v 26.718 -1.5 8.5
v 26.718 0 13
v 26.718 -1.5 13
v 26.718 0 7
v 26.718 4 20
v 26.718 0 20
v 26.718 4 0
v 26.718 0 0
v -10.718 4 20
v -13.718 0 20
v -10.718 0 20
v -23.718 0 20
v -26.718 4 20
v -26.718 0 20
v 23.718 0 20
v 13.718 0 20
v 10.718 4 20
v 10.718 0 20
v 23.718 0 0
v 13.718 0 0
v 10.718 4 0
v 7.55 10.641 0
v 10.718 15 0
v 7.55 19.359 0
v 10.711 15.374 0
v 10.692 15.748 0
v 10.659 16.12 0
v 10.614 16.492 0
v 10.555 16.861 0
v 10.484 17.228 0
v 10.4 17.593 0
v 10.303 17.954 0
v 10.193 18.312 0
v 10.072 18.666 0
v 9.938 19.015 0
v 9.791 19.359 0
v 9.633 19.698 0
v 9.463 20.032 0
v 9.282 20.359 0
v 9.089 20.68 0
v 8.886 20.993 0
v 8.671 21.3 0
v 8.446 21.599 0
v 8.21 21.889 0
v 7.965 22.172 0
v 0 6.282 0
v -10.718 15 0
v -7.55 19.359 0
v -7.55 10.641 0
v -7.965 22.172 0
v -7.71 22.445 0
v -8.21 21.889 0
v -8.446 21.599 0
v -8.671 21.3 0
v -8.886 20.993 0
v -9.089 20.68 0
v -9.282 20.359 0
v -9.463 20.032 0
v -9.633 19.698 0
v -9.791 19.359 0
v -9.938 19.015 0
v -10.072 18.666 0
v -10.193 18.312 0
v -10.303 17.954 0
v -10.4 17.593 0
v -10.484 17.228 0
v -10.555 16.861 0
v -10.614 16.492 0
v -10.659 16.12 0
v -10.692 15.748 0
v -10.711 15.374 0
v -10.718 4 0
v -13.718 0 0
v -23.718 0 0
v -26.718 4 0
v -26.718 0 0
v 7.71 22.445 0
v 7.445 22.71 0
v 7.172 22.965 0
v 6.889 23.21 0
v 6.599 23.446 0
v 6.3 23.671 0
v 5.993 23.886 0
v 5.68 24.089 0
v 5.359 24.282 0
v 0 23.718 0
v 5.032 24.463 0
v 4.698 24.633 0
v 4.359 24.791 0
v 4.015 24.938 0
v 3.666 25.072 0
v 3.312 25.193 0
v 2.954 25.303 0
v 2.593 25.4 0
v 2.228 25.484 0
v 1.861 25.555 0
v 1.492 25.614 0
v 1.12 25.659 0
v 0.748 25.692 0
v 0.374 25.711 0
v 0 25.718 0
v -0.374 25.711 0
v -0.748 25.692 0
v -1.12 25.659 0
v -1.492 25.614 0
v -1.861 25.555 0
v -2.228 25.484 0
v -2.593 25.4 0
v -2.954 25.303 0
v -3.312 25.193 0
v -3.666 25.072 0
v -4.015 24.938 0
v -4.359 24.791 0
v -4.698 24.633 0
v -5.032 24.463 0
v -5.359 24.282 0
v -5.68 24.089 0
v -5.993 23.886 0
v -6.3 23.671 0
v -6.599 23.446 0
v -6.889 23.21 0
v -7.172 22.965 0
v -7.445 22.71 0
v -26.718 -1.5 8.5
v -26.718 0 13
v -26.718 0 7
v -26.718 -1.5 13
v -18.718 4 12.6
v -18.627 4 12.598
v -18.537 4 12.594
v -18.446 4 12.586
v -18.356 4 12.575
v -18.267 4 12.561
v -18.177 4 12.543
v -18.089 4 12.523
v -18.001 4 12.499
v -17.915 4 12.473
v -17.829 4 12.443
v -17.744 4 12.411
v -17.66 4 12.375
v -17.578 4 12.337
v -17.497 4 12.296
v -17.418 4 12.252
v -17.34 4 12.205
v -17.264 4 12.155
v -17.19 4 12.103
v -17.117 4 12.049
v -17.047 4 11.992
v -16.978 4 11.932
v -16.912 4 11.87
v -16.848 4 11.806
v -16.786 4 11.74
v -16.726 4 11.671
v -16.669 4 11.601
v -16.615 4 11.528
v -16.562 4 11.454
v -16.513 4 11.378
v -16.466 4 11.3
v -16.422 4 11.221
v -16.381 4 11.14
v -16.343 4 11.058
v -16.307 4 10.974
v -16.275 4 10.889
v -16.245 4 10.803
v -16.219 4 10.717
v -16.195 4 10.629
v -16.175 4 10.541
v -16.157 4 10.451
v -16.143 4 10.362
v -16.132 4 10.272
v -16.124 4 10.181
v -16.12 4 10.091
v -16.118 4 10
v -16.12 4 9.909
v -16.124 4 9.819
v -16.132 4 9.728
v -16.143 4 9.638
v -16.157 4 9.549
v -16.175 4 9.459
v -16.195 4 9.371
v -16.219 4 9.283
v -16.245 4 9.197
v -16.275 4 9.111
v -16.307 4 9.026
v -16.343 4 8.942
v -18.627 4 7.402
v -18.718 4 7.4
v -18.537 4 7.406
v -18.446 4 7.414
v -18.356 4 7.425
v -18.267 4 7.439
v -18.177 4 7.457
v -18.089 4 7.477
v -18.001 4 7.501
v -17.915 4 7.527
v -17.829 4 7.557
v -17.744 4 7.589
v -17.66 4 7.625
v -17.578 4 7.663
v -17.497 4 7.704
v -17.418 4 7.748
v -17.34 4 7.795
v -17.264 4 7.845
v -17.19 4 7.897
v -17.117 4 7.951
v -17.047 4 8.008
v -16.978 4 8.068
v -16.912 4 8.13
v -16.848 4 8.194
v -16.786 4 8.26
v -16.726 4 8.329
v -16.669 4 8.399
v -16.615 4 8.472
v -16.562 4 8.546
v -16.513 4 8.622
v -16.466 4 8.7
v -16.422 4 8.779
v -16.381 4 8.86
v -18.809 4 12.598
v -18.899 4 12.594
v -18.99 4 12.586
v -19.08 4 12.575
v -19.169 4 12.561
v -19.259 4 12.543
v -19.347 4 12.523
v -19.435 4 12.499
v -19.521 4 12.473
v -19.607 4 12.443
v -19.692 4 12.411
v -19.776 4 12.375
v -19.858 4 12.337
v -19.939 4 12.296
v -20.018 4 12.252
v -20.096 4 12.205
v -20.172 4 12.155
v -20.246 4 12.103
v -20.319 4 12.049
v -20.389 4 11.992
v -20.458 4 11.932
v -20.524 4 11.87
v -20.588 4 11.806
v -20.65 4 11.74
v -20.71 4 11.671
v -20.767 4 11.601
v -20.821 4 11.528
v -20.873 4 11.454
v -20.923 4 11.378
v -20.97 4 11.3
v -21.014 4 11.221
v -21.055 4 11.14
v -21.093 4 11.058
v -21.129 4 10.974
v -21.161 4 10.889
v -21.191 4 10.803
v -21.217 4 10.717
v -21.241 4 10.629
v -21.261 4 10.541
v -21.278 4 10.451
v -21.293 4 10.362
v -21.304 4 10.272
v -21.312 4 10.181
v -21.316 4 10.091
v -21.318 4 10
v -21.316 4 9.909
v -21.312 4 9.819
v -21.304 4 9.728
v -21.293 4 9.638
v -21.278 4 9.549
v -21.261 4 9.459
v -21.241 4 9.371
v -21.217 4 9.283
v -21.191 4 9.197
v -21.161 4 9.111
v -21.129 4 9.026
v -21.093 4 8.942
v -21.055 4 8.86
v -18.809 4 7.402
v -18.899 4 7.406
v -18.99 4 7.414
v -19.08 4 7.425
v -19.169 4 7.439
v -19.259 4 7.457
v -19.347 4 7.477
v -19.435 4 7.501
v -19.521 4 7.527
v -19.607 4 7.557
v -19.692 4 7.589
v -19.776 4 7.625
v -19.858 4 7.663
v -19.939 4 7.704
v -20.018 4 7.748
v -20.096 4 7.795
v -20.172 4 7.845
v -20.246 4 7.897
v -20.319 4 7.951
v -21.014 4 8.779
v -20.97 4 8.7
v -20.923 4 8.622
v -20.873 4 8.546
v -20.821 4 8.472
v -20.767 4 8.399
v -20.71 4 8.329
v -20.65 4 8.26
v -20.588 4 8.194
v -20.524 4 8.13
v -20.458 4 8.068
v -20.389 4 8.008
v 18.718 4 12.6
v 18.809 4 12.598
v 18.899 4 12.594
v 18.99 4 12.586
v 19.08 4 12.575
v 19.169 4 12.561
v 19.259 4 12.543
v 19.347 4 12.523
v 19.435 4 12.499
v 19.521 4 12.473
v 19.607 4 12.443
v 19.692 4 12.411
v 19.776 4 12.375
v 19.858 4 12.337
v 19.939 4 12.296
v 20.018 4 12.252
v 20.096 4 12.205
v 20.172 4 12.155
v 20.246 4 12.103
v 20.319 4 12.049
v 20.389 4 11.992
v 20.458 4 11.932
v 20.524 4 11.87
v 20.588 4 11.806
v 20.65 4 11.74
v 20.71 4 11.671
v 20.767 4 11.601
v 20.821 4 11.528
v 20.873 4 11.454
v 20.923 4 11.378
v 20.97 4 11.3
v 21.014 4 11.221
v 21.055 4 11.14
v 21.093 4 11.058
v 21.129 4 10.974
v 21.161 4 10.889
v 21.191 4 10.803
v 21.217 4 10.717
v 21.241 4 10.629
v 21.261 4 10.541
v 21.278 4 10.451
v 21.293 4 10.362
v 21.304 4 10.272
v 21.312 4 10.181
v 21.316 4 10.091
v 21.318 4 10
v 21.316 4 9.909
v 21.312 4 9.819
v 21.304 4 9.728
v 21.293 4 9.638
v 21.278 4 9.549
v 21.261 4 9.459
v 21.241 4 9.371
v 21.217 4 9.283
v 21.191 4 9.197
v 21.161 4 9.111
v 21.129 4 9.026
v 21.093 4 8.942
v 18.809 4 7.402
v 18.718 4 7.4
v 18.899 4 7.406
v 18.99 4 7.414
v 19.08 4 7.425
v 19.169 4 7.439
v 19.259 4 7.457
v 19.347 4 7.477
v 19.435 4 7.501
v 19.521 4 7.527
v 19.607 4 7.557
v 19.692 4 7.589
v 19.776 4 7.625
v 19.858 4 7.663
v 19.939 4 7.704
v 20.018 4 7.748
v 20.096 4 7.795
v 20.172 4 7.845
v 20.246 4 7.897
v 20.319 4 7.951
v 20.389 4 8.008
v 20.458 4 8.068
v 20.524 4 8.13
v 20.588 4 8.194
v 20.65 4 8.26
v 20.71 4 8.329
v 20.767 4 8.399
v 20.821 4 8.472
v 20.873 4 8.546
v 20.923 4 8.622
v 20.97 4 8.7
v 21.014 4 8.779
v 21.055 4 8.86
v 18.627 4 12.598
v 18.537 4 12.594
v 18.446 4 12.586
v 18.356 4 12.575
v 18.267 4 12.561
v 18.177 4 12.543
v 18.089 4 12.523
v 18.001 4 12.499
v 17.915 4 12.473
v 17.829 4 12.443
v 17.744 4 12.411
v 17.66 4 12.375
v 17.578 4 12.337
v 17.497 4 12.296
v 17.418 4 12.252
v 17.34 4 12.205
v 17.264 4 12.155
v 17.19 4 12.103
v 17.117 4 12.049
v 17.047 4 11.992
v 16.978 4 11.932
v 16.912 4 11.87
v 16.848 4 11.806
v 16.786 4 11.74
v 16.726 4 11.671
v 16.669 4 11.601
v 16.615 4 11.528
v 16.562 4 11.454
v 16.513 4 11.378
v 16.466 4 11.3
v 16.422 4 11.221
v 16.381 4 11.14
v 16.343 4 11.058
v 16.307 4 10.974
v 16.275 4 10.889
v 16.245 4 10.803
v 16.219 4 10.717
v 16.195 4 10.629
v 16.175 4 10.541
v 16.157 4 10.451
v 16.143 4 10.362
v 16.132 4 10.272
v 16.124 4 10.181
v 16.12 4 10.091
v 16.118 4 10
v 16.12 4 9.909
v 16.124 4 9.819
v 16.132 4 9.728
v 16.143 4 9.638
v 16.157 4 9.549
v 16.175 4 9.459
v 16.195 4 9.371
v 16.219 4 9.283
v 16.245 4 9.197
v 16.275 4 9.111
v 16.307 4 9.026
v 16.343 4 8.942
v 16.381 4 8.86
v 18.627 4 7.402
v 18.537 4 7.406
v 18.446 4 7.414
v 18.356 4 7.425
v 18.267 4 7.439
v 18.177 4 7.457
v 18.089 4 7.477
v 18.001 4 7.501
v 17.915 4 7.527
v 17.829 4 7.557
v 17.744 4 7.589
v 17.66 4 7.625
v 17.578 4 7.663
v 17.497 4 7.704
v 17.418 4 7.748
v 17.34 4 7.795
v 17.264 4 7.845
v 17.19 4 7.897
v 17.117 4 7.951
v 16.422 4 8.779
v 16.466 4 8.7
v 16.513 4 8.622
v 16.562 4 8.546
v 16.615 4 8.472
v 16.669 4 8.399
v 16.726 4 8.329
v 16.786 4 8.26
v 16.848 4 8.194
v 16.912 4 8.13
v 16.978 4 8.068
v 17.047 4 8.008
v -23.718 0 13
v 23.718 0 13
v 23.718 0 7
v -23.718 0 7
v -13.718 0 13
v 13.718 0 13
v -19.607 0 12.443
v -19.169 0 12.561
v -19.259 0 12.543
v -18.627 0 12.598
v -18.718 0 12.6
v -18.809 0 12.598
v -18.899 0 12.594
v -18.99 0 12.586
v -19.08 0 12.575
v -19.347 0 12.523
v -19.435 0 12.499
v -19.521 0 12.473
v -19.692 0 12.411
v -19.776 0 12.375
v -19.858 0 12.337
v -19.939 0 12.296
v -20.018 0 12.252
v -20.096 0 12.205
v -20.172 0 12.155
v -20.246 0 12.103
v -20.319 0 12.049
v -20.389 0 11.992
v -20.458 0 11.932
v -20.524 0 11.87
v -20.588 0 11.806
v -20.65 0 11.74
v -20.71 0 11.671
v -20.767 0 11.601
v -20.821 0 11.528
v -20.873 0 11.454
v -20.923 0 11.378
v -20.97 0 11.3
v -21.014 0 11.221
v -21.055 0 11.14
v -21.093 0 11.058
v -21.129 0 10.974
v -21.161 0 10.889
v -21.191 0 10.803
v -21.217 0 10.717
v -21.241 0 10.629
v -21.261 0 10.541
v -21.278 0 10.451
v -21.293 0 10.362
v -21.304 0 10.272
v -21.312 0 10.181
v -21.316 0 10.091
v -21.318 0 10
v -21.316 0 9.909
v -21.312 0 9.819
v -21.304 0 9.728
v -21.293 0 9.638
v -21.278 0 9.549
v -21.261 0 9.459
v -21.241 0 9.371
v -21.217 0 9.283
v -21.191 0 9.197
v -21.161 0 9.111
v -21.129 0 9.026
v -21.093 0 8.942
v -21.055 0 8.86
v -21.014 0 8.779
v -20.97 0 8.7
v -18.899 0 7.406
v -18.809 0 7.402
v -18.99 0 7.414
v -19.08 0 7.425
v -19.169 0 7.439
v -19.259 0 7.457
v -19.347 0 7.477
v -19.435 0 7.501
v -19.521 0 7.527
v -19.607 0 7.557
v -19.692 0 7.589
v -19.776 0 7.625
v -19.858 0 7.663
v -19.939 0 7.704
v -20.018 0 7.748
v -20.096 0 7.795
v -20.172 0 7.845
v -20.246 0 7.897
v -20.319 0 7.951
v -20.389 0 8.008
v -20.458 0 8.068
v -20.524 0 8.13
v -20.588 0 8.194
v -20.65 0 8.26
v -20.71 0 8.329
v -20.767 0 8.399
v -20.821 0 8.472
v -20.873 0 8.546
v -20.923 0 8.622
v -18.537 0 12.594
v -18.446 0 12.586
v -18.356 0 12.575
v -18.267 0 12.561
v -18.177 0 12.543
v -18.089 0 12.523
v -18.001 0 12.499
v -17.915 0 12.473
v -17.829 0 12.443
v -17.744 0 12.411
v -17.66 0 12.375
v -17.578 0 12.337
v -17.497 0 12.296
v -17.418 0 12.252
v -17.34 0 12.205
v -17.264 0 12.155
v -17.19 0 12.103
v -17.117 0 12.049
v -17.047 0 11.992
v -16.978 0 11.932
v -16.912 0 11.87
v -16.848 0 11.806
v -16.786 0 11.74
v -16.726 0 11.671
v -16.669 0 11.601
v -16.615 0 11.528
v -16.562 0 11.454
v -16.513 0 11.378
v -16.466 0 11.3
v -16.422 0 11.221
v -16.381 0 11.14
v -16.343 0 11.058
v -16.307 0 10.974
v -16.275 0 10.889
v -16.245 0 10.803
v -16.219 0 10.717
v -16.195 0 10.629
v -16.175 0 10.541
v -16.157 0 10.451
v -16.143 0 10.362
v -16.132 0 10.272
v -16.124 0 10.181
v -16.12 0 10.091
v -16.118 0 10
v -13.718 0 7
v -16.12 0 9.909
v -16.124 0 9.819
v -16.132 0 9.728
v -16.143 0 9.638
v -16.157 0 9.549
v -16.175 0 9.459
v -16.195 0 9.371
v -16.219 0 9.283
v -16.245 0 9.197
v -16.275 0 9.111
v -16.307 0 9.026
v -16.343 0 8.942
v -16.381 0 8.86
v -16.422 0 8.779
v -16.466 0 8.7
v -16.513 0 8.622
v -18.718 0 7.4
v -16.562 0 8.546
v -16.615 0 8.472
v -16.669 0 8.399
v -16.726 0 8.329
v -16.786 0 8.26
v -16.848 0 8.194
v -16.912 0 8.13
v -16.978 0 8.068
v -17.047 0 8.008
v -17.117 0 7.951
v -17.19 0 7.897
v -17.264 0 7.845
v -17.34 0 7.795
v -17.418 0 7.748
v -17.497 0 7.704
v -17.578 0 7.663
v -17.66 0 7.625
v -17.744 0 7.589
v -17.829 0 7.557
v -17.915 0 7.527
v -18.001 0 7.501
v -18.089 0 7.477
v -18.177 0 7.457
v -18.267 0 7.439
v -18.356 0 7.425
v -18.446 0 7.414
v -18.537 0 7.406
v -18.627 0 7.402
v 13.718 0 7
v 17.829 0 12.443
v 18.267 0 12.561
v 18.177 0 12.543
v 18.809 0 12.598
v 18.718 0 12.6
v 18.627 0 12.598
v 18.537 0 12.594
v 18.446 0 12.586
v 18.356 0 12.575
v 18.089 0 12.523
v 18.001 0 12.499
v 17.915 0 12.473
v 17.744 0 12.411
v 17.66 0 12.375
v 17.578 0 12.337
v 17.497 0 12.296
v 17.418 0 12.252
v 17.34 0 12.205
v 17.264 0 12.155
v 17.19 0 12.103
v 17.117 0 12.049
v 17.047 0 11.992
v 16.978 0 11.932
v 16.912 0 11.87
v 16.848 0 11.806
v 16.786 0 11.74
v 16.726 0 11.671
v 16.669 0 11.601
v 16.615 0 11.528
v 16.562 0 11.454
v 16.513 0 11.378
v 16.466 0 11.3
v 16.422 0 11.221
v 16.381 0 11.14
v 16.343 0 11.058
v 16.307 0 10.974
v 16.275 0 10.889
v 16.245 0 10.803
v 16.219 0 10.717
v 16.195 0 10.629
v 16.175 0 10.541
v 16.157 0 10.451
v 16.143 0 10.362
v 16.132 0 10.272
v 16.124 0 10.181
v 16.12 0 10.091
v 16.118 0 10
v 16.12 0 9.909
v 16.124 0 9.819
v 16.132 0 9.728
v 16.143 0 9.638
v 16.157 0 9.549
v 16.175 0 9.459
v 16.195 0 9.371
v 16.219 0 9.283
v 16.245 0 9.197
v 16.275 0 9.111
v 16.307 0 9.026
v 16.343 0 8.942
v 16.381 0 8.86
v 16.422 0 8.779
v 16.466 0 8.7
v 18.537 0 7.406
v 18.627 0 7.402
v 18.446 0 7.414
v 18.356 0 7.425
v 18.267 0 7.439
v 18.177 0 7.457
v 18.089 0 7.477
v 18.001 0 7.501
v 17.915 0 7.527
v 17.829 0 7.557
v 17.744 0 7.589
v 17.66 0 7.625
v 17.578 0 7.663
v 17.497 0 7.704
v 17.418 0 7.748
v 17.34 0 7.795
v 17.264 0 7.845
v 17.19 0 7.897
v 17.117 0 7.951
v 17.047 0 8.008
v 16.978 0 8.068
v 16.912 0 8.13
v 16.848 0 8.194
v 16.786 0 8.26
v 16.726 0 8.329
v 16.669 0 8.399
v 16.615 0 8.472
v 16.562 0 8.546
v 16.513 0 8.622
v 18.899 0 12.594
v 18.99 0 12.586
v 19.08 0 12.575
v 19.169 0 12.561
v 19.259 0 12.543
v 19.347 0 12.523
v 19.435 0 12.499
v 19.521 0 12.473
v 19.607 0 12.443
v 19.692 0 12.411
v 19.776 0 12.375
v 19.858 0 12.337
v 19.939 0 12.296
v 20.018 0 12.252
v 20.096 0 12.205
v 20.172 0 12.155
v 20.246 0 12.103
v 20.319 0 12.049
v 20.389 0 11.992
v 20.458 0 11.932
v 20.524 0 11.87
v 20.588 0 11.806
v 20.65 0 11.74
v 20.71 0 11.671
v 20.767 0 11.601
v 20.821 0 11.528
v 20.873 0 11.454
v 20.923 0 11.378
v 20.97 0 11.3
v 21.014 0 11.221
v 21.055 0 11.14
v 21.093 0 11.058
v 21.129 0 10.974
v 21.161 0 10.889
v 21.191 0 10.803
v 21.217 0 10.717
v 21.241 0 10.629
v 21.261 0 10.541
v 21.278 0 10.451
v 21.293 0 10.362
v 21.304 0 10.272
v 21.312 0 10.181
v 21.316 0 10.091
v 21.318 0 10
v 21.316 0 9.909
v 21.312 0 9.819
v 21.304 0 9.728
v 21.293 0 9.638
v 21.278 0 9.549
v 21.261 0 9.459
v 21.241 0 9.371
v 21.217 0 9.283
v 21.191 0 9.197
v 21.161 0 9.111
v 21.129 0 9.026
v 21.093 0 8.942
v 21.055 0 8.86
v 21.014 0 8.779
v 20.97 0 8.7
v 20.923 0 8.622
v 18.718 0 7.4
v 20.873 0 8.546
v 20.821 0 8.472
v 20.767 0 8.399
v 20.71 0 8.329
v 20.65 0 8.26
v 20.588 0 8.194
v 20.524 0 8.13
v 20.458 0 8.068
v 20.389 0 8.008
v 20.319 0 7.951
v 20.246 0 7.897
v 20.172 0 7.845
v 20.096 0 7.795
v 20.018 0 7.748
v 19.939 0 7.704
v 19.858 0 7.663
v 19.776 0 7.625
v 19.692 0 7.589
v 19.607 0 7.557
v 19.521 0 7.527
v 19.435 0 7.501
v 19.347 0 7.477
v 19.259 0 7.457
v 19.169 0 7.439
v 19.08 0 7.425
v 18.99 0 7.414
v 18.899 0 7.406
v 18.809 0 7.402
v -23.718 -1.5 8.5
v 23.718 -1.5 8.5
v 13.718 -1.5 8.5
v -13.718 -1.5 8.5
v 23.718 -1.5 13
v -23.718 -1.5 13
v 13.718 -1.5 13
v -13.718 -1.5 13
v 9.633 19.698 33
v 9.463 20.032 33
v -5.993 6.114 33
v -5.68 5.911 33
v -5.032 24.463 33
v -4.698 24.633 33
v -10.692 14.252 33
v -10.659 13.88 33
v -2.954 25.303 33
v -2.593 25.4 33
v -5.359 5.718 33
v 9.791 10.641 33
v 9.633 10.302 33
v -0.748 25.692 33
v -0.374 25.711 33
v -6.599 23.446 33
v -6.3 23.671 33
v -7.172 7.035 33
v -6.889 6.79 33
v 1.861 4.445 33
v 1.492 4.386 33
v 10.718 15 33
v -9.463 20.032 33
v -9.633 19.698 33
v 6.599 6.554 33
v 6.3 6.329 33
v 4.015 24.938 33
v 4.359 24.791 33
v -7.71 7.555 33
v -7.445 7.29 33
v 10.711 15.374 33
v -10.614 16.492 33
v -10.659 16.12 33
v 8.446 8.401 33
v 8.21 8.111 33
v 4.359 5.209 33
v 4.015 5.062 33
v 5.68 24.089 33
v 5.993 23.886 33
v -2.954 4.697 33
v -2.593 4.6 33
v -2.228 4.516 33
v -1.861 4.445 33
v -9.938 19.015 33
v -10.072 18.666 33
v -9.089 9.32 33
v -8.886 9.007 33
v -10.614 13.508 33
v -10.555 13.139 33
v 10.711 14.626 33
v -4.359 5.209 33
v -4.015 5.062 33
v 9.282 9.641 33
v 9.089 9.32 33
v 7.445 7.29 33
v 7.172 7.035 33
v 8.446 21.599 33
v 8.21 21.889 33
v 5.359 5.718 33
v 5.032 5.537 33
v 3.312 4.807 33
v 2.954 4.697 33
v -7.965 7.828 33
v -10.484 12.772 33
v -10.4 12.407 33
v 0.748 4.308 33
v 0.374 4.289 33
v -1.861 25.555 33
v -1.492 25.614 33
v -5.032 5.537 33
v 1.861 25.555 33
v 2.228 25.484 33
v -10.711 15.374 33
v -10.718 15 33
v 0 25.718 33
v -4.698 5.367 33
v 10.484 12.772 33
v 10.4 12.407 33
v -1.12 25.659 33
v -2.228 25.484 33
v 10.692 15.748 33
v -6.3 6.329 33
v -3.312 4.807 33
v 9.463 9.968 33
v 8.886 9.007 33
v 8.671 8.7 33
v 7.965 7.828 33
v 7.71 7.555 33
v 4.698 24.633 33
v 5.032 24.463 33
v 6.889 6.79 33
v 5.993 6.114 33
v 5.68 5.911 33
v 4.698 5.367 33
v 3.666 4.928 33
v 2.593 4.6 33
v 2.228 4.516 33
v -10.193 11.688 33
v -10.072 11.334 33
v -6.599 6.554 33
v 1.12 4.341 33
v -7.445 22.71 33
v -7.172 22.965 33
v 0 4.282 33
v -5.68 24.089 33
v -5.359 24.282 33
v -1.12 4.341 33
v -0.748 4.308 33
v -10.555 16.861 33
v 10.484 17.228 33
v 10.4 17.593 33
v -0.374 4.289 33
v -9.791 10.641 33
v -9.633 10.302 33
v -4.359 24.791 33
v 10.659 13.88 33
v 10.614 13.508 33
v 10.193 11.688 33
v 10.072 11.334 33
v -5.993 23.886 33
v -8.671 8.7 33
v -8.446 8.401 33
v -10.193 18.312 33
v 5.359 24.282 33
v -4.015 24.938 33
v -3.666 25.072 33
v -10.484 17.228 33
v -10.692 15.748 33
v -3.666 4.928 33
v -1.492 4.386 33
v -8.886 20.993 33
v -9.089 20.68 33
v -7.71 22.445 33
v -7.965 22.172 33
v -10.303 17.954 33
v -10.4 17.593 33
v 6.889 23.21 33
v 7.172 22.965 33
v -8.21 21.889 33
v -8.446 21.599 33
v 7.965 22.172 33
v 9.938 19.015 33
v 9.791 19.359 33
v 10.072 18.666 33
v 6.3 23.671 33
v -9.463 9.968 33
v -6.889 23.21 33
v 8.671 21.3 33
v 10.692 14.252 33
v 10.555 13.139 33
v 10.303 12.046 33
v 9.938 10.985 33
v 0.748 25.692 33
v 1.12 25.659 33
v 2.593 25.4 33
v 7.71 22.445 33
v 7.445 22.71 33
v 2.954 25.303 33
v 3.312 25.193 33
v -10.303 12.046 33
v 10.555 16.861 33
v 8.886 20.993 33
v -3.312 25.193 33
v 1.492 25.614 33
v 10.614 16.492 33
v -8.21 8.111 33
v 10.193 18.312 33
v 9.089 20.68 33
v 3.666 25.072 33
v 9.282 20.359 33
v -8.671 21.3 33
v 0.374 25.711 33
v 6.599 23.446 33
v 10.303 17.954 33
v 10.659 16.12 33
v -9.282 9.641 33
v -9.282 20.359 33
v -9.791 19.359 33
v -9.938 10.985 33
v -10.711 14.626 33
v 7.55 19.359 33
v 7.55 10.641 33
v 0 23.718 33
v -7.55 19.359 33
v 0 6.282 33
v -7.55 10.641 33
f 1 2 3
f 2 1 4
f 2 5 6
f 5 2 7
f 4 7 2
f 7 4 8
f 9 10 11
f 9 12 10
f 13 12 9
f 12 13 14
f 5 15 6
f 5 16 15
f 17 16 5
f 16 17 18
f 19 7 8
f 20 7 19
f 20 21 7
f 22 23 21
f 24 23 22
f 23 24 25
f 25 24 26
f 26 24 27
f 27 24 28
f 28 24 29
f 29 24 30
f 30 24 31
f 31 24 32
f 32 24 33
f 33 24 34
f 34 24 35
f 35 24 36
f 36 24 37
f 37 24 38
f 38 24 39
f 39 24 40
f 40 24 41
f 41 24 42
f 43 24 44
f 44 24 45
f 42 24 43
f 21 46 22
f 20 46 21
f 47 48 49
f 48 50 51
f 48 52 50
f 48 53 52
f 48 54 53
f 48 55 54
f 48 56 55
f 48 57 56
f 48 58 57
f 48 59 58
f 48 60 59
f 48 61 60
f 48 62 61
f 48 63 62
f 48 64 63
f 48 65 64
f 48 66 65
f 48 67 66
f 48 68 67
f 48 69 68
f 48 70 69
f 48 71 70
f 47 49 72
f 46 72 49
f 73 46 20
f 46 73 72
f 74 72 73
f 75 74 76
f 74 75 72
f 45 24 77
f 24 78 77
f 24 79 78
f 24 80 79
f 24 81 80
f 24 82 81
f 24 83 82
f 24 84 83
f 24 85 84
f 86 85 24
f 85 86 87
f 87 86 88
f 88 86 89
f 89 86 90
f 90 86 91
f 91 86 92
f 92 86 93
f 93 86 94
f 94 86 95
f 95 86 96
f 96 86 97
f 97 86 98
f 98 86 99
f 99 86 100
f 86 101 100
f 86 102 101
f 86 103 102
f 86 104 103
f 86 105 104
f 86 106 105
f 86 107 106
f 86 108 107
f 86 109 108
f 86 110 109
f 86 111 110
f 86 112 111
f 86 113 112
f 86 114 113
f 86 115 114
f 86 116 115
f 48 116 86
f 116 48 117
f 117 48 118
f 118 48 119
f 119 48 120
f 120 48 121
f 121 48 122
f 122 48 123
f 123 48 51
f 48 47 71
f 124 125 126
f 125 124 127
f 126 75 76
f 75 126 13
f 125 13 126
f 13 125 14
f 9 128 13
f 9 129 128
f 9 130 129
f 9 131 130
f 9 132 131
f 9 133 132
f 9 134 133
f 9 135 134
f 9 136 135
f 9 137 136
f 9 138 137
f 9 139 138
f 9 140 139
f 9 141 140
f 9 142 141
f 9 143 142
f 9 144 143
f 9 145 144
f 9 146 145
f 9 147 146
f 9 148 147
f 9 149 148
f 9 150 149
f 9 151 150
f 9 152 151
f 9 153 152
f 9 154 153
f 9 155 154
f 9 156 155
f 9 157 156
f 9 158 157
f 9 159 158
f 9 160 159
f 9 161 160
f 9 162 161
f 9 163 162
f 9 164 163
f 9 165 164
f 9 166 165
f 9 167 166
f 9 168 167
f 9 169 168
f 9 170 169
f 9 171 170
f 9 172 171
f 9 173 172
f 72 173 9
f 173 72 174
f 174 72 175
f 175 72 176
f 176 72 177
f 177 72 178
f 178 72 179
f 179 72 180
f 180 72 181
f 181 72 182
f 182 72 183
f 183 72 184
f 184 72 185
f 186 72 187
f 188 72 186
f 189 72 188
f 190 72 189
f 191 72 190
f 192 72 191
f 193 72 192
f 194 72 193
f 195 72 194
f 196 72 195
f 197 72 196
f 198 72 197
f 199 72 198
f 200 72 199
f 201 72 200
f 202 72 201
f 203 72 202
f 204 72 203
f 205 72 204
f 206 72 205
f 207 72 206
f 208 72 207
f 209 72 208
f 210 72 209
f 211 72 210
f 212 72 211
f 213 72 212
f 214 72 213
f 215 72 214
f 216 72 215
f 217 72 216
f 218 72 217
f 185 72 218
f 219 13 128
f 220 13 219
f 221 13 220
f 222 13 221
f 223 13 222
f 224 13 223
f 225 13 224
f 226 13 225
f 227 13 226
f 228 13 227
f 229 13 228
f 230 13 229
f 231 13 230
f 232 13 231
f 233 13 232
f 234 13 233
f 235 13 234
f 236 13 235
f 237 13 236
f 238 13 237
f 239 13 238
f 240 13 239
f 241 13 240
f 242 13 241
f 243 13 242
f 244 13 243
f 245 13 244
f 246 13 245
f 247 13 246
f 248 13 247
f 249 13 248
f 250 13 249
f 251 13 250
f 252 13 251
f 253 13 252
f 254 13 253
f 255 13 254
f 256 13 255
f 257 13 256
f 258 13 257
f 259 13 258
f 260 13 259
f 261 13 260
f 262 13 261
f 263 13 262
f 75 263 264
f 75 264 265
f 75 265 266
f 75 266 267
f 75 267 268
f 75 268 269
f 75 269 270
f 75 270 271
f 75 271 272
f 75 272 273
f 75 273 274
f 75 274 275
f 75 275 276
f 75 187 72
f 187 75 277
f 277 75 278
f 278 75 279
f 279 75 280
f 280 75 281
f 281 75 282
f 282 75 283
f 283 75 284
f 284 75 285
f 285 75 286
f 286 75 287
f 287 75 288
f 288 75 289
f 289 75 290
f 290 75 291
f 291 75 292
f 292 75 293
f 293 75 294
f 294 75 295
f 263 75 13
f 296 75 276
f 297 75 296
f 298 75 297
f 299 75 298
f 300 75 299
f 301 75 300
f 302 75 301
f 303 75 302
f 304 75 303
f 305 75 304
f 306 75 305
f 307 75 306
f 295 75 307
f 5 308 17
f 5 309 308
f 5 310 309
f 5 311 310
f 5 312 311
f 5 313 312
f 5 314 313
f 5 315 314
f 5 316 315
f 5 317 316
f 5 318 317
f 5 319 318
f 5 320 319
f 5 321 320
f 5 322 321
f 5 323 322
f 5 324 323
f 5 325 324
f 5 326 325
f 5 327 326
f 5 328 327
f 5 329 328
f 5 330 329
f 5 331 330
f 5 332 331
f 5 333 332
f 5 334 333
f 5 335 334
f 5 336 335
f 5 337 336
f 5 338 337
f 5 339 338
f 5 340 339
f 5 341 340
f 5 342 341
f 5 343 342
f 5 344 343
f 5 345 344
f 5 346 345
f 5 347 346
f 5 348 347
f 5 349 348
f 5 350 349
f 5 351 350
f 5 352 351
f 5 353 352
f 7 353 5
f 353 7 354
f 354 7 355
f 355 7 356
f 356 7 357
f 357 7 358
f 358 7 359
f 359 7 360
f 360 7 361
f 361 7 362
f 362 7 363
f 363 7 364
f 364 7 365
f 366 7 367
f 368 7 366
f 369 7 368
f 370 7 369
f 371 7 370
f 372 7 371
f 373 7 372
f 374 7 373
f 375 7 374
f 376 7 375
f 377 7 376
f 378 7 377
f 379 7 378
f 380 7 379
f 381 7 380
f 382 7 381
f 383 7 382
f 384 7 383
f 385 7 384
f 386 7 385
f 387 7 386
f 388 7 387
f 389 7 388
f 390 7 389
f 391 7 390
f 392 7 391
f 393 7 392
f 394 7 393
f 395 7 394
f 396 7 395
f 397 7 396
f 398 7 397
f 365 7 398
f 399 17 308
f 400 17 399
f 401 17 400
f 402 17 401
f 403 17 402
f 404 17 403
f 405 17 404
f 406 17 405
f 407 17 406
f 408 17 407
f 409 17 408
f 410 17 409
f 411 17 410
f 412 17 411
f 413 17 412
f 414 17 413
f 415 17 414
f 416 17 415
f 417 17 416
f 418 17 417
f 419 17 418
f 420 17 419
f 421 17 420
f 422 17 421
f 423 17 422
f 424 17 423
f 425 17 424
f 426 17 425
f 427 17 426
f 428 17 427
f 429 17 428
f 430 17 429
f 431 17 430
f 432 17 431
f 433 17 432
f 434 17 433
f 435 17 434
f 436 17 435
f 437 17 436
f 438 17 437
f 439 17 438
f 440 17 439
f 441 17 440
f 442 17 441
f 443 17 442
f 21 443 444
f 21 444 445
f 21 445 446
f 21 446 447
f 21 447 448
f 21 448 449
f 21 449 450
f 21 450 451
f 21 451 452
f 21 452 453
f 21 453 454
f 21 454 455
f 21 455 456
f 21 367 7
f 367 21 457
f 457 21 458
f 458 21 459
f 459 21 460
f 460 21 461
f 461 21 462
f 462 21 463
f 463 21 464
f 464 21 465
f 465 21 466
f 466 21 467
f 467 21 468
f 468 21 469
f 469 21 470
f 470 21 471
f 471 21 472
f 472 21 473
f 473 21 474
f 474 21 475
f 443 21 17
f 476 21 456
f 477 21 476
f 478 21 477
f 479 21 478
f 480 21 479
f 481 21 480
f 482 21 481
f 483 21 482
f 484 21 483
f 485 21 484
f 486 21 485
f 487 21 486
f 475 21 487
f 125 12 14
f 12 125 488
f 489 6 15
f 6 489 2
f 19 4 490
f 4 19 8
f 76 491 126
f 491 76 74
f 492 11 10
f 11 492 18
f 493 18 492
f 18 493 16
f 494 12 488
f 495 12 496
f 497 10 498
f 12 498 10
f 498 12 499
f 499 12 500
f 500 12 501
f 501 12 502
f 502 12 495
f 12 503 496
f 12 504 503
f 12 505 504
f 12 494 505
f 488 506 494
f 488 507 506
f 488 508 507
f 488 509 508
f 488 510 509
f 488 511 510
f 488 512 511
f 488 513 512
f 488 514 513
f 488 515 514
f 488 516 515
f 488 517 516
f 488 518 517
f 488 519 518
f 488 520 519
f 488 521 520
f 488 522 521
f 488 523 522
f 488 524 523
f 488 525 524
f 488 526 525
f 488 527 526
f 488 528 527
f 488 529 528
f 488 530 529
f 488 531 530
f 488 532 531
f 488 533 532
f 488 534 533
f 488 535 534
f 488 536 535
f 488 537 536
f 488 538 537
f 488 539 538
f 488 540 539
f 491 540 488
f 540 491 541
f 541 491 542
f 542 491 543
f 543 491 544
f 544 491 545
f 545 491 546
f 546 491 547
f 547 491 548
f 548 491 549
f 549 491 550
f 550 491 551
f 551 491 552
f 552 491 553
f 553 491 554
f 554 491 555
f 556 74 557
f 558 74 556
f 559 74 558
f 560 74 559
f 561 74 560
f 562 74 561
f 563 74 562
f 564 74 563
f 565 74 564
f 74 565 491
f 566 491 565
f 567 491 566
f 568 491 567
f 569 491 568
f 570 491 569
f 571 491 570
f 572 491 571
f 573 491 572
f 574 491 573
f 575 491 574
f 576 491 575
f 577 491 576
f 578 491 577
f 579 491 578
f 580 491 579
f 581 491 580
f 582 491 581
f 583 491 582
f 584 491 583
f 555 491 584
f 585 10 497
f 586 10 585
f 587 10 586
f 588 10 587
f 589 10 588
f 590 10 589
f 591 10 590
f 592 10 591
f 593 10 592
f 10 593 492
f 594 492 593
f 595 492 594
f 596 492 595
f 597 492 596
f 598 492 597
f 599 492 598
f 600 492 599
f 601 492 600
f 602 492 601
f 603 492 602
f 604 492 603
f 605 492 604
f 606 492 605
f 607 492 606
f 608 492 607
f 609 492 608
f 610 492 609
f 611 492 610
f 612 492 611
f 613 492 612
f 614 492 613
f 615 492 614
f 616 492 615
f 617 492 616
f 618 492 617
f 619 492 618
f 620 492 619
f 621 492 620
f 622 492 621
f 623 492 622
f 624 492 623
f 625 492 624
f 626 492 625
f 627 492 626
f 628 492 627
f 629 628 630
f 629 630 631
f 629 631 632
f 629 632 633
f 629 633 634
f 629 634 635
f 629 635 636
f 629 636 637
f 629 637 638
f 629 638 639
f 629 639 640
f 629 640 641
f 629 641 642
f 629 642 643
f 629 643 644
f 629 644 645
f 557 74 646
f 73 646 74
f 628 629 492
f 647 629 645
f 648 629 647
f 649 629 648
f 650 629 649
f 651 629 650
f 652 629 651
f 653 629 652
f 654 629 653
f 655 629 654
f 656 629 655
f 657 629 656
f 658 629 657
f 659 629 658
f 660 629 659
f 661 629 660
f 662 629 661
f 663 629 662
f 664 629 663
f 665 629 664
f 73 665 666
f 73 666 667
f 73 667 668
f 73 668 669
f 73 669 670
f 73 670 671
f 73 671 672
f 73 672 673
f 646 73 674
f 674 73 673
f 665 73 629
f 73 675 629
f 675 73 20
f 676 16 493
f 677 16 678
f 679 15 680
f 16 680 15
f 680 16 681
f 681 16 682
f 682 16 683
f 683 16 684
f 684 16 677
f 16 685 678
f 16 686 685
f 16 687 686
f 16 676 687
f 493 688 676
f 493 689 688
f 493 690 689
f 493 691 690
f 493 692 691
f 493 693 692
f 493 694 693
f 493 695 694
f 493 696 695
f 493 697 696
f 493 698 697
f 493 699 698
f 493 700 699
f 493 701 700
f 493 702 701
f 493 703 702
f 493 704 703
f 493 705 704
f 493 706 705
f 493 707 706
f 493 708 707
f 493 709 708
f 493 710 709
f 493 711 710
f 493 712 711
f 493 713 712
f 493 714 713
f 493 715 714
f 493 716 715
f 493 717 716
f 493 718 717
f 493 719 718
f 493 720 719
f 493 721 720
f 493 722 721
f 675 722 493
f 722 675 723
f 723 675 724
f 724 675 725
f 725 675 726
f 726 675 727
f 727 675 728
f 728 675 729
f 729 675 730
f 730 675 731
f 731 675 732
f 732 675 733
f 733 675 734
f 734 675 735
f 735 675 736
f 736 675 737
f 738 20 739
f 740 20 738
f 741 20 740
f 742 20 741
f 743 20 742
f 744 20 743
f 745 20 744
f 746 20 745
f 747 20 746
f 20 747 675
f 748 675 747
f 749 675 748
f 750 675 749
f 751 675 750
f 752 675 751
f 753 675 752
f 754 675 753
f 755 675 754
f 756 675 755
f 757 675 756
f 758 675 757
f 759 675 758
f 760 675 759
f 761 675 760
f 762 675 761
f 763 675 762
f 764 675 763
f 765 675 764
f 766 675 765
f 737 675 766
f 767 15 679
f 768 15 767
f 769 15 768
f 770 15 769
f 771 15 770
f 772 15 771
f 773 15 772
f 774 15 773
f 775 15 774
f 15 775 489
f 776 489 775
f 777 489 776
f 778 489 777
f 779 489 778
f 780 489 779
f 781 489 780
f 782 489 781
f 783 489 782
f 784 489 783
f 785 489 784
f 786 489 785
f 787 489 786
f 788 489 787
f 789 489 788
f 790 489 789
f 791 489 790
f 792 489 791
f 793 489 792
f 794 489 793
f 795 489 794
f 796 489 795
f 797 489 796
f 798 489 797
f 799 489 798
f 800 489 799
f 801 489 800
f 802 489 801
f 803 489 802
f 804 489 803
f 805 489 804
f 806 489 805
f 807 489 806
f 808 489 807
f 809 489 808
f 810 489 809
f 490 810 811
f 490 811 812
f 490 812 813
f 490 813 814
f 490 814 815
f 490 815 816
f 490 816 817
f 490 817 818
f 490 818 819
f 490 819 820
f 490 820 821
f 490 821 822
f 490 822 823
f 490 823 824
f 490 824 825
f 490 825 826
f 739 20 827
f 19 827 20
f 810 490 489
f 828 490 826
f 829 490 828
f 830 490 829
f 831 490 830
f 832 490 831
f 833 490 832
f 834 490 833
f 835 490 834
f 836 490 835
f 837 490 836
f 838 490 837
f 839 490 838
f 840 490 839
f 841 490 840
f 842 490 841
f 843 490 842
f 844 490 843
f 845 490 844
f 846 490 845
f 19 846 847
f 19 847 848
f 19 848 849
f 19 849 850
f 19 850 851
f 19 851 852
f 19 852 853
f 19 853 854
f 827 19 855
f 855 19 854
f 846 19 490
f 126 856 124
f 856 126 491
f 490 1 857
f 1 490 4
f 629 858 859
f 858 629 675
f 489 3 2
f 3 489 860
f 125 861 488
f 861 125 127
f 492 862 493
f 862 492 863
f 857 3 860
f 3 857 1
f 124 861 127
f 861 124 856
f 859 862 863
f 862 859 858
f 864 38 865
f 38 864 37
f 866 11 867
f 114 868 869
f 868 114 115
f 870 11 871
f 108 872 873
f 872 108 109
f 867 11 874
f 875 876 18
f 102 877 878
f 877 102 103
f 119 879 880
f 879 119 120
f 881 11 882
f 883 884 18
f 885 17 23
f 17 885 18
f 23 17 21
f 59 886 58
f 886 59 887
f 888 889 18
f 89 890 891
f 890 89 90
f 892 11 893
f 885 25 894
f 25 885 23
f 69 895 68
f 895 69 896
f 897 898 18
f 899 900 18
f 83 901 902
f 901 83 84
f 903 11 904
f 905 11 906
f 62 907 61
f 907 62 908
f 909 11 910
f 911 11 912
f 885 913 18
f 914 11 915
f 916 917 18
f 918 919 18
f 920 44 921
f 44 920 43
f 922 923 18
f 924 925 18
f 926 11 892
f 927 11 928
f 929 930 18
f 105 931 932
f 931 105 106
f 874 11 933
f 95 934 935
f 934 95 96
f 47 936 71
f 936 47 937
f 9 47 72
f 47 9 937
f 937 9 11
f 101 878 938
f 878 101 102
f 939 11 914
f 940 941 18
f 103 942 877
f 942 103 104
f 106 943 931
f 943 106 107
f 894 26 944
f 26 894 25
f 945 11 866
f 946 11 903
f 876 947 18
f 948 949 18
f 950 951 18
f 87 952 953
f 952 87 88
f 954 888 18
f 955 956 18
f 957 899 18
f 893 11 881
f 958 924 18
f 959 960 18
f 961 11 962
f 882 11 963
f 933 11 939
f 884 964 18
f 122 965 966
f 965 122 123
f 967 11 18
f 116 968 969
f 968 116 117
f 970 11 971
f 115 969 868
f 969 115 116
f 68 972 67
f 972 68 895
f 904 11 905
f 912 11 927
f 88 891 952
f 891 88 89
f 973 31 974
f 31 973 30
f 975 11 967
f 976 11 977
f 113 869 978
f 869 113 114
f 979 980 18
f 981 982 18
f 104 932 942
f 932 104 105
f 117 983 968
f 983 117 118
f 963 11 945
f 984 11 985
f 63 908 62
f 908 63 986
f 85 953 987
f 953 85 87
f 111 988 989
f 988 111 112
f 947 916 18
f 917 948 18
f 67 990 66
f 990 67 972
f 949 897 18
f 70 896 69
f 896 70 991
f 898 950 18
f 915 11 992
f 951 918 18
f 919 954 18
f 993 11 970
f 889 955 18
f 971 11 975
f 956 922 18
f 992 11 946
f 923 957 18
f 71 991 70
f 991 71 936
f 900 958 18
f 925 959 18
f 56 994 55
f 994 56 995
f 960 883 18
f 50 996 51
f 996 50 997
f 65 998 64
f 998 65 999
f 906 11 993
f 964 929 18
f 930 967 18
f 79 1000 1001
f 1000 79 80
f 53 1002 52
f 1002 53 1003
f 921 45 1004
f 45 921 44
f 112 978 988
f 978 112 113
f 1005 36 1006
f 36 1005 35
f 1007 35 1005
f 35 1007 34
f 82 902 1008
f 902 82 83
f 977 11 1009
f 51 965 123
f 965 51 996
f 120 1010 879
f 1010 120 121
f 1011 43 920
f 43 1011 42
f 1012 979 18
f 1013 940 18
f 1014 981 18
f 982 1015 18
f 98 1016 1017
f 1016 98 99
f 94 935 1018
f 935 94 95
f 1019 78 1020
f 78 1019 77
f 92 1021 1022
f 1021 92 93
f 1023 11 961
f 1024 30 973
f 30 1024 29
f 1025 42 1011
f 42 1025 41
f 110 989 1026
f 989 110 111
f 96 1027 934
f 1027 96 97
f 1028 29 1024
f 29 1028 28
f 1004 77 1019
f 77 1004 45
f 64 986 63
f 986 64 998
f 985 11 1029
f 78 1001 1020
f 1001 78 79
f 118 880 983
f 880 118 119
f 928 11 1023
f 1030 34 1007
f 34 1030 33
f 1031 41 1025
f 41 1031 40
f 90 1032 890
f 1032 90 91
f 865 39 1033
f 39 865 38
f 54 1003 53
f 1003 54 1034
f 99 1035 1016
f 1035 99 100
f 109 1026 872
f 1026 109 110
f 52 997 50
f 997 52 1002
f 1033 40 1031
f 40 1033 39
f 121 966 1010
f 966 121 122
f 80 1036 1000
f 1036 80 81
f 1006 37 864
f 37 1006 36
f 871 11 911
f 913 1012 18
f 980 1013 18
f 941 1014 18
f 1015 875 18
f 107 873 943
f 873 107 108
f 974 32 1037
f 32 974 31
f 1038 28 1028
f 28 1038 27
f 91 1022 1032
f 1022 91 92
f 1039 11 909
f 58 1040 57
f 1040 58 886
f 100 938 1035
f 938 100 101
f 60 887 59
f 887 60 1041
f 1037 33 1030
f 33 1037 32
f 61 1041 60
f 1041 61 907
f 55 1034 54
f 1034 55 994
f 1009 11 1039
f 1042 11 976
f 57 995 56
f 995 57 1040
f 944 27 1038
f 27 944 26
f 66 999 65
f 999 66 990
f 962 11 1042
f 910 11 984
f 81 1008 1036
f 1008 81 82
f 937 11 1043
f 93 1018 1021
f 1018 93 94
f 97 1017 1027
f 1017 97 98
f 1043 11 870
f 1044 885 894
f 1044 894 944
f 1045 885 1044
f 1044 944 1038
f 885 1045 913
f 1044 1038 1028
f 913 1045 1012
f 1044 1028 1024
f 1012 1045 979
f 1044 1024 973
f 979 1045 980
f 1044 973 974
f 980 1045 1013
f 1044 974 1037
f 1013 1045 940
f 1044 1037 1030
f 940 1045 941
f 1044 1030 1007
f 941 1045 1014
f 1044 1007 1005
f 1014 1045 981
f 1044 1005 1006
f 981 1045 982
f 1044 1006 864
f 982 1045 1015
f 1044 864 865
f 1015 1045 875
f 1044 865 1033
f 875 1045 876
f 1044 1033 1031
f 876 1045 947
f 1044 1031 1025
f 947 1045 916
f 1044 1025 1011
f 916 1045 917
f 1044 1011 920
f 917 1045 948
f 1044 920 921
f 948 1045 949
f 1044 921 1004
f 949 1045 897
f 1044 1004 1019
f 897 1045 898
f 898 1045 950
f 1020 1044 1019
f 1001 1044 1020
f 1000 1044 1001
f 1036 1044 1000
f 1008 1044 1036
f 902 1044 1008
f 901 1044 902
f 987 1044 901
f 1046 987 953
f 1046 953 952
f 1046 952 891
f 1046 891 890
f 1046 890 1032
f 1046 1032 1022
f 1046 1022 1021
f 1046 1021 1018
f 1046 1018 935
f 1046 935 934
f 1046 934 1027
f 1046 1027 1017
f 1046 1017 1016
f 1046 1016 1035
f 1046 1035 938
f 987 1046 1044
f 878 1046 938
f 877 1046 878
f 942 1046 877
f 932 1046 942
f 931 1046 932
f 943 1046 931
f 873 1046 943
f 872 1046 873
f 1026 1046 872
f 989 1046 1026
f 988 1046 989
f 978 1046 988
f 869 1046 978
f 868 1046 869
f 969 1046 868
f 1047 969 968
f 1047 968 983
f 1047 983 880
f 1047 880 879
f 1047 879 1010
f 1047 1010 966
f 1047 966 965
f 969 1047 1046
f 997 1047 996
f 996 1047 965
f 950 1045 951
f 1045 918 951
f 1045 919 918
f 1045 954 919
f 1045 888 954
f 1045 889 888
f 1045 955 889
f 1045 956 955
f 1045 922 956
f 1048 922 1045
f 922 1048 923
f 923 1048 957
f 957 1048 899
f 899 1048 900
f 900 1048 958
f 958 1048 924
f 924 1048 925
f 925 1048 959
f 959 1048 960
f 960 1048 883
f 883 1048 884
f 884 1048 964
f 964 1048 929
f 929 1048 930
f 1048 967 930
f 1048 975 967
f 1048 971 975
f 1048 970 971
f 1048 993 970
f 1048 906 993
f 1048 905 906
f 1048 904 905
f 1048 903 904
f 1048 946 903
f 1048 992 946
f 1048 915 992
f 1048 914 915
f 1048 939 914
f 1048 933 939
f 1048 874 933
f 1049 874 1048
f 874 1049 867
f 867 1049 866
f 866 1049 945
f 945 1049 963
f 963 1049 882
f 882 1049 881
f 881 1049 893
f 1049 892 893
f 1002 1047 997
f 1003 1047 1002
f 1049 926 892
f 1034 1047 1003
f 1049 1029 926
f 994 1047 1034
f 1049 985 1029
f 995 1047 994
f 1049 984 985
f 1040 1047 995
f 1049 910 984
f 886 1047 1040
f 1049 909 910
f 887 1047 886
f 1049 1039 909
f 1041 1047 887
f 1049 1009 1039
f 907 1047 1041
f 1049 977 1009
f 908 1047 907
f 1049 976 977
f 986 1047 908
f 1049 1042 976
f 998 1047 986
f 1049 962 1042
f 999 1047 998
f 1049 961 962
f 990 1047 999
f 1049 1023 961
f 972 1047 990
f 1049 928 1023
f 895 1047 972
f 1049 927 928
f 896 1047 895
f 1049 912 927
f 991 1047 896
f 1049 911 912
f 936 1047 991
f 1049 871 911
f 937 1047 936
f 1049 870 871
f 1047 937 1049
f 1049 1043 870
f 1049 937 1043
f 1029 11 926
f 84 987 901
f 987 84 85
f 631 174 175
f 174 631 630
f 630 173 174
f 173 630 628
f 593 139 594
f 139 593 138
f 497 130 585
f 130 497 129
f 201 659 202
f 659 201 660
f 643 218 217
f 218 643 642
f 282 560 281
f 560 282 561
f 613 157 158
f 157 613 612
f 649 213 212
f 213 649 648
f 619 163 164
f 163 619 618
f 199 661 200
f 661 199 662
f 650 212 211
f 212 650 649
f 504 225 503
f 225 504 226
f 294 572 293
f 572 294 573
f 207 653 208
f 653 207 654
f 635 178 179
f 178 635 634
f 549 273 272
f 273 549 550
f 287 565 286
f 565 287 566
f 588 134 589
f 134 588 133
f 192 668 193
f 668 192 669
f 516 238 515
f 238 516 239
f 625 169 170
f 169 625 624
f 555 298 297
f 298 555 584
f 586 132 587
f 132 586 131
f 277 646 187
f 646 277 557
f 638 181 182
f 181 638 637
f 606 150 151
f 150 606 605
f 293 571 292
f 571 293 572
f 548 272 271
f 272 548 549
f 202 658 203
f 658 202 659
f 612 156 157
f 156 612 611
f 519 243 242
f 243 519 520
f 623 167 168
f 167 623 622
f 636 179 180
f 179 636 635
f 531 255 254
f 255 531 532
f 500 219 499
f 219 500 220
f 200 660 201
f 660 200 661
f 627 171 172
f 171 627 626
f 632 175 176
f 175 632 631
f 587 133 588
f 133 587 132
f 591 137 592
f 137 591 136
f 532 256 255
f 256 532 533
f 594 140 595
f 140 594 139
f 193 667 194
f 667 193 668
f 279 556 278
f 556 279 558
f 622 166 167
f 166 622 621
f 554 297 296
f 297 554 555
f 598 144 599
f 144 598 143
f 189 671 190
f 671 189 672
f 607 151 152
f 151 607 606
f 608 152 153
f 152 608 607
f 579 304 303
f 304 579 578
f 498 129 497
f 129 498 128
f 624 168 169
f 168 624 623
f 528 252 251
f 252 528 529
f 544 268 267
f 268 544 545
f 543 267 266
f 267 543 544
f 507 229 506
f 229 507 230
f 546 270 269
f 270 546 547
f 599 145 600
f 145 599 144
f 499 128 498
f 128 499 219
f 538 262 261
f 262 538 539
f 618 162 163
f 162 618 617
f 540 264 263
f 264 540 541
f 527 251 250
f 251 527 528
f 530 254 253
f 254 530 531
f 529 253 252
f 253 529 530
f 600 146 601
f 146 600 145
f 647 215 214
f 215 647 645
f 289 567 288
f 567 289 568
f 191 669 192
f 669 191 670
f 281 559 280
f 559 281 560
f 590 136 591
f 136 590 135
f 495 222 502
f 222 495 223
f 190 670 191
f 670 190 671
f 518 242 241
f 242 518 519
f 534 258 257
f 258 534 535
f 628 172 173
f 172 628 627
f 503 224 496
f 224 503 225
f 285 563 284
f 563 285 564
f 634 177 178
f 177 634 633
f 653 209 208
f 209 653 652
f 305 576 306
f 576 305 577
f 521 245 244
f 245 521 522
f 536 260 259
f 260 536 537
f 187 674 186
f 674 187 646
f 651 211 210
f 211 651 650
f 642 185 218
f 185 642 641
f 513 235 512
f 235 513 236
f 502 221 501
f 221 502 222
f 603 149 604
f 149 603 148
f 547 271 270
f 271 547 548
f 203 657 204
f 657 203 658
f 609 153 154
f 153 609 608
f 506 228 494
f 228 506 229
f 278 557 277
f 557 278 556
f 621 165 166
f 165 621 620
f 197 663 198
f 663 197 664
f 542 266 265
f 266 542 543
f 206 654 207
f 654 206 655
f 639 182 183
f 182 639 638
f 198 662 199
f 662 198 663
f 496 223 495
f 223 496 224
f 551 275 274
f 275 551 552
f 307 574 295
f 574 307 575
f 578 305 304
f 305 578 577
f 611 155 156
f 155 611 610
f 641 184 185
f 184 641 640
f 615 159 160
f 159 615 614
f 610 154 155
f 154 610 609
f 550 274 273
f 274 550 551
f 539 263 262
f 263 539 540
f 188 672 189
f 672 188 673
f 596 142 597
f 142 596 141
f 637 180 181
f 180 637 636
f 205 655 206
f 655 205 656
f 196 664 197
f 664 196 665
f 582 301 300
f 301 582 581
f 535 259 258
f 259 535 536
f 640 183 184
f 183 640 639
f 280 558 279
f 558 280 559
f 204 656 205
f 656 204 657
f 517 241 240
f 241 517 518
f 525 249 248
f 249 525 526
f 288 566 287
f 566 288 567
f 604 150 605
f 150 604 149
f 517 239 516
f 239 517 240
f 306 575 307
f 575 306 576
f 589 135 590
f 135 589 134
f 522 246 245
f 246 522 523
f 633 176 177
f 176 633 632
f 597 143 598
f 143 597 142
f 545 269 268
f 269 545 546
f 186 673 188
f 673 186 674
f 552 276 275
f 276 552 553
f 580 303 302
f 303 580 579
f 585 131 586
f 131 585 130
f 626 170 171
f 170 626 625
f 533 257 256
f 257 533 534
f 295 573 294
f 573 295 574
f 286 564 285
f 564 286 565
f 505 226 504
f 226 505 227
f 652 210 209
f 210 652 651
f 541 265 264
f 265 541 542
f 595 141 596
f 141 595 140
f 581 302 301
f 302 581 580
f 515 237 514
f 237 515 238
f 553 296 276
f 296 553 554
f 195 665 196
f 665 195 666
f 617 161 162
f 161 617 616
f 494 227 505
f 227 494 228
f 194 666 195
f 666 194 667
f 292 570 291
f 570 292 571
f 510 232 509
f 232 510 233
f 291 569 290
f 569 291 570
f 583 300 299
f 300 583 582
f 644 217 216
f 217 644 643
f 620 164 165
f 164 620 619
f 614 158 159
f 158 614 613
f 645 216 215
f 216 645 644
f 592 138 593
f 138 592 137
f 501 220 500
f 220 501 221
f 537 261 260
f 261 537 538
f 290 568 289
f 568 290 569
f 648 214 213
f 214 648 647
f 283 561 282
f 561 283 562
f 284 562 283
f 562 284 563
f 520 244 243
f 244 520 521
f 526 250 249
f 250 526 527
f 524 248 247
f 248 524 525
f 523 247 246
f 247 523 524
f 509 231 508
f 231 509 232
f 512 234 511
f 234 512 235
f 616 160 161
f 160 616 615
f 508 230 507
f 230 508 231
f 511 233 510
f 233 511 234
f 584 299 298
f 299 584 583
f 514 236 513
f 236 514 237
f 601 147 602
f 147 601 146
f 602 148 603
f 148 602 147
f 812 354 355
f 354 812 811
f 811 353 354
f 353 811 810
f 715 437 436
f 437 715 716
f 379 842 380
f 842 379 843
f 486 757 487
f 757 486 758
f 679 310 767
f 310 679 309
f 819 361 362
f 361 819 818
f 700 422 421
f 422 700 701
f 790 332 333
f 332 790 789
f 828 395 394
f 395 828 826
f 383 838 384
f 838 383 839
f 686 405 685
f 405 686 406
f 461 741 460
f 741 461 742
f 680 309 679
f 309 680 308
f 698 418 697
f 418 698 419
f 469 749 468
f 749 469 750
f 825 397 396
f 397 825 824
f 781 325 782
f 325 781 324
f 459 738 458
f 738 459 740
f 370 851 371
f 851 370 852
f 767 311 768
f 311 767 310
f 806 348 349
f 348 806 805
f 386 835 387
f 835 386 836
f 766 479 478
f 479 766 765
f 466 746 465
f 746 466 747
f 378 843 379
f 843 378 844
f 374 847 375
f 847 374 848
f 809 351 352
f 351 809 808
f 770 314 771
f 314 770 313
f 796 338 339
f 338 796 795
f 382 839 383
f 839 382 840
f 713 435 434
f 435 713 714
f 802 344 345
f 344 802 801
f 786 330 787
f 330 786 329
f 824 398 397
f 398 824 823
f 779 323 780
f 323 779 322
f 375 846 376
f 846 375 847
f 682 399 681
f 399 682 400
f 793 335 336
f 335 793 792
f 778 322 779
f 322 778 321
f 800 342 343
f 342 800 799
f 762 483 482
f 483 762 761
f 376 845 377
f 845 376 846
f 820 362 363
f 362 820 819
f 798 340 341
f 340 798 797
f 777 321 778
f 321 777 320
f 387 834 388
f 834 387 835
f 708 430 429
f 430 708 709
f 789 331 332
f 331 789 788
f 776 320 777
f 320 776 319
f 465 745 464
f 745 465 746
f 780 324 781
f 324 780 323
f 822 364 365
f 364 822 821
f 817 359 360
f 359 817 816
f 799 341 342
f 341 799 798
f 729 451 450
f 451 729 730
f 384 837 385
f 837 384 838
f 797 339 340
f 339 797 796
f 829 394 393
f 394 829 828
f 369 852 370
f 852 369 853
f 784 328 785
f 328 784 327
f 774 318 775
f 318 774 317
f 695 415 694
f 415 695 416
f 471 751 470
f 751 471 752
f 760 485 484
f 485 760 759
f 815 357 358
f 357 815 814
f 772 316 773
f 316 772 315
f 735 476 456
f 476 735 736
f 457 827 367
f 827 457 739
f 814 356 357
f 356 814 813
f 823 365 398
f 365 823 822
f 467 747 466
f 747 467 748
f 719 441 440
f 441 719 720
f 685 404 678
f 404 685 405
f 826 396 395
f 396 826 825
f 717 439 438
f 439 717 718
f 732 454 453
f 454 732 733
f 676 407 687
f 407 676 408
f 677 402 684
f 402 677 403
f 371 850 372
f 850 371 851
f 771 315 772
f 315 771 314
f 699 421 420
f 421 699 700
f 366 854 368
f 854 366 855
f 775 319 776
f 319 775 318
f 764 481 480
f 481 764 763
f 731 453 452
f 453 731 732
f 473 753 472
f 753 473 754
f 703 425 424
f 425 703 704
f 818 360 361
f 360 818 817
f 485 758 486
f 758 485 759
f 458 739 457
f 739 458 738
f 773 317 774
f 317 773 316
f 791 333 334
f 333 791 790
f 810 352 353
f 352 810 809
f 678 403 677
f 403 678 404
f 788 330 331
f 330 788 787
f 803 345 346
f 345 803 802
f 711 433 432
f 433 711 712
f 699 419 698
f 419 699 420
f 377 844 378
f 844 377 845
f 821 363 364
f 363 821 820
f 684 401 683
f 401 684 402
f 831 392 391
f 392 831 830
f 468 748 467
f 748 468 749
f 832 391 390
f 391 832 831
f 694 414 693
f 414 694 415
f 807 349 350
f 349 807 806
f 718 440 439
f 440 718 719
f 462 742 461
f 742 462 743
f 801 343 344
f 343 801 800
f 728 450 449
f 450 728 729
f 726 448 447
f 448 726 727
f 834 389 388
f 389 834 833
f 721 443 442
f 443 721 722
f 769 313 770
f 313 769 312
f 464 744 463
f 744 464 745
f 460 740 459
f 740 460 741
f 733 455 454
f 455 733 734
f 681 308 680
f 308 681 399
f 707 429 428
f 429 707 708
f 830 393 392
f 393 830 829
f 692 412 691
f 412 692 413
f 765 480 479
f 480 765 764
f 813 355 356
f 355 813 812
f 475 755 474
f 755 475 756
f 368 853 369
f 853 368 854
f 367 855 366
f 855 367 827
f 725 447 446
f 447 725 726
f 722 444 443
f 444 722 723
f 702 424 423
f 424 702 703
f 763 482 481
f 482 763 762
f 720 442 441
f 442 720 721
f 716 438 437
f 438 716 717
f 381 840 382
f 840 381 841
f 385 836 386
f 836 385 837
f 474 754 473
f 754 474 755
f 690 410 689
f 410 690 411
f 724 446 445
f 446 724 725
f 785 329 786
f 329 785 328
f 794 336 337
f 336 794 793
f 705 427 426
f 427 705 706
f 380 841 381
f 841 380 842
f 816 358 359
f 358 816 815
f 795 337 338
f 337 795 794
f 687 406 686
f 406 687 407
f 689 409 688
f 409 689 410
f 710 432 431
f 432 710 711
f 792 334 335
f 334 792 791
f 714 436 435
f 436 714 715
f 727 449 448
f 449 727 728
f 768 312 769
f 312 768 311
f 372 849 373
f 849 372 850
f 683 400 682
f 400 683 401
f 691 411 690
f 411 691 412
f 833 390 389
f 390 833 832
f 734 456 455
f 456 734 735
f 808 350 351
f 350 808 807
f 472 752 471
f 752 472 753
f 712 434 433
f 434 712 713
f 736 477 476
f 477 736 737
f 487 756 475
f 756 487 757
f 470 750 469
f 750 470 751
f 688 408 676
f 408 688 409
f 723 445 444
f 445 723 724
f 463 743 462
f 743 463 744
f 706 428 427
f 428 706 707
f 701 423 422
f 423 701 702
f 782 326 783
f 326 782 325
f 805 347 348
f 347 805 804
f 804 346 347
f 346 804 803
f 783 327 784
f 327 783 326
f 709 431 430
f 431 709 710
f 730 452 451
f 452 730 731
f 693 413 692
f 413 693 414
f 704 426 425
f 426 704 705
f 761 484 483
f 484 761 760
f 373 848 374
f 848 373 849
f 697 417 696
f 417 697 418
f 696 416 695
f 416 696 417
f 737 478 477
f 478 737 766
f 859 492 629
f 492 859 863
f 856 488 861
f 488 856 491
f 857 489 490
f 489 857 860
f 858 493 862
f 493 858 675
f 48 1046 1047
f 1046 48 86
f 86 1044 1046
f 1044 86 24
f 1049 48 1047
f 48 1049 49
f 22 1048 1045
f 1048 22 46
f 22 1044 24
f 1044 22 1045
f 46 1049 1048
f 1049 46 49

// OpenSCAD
//3D printer LM8LUU bracket for 2020 extrusion
//2017, John Stäck (john@stack.se)
//Licensed under Creative Commons Attribution Share-Alike (CC BY-SA 3.0)

$fn=180;

rail_height=20; //2020 rail
slot_width=6;
notch_depth=1.5;
rail_screw_diameter=5.2; //M5 + margin

slot_nut_length=10;

//LM8LUU linear bearing
bearing_diameter=15;
//bearing_height=45; //Full LM8LUU bearing
bearing_height=33; //Only covers part between "notches". Make as long as you wish.

bearing_margin=0.1; //Increase in diameter depending on printer behaviour. Make test pieces for a snug fit.

bearing_hole_sides=6;

bearing_hole_inscribed=(bearing_diameter+bearing_margin)/cos(180/bearing_hole_sides);

echo(bearing_hole_inscribed);

bearing_holder_diameter=bearing_hole_inscribed+4;
axle_offset=15; //Distance from face of bracket to center of bearing/axle. Needs to match z-nut bracket


bracket_width=26;
endplate_thickness=0;
bracket_thickness=4;
e=0.01;
hole_inset=8; //distance from edge of bracket to mounting hole
bracket_length=bearing_holder_diameter+hole_inset*4;

difference() {
    union() {
        
       //Base parts of bracket
       translate([-bracket_length/2,0,0]) {
           cube([bracket_length, bracket_thickness, rail_height]);

       }
       
       
       //Notch into rail
       notch_points=[[0,-slot_width/2],[notch_depth,-slot_width/2+notch_depth],[notch_depth,slot_width/2],[0,slot_width/2]];
       notch_path=[[0,1,2,3,0]];
       
       translate([bracket_length/2+endplate_thickness,0,rail_height/2]) rotate([90,0,-90])  linear_extrude(height=bracket_length+endplate_thickness*2) polygon(points=notch_points, paths=notch_path, convexity=2);
       
       //Linear bearing holder
       hull() {
       translate([0,axle_offset,0]) {
            cylinder(d=bearing_holder_diameter,h=bearing_height);
       }
       
       //Make it beefier
       translate([-bearing_holder_diameter/2,0,0]) cube([bearing_holder_diameter, axle_offset, rail_height]);
       }
    }
    
    union() {
        //Holes for mounting bolts to rail
        for(i=[-1,1])
            translate([i*(bracket_length/2-hole_inset), -e, rail_height/2]) rotate([-90,0,0]) cylinder(d=rail_screw_diameter, h=bracket_thickness+2*e);
        
        //Cutout in notch for slot nuts
         for(i=[-1,1])
            translate([i*(bracket_length/2-hole_inset)-slot_nut_length/2,-notch_depth-e,0]) cube([slot_nut_length,notch_depth+e,rail_height]);
        
        //Linear bearing holder
        translate([0,axle_offset,-e]) {
            rotate([0,0,30]) cylinder(d=bearing_hole_inscribed, $fn=bearing_hole_sides, h=bearing_height+2*e);
        }
        
    }
}
